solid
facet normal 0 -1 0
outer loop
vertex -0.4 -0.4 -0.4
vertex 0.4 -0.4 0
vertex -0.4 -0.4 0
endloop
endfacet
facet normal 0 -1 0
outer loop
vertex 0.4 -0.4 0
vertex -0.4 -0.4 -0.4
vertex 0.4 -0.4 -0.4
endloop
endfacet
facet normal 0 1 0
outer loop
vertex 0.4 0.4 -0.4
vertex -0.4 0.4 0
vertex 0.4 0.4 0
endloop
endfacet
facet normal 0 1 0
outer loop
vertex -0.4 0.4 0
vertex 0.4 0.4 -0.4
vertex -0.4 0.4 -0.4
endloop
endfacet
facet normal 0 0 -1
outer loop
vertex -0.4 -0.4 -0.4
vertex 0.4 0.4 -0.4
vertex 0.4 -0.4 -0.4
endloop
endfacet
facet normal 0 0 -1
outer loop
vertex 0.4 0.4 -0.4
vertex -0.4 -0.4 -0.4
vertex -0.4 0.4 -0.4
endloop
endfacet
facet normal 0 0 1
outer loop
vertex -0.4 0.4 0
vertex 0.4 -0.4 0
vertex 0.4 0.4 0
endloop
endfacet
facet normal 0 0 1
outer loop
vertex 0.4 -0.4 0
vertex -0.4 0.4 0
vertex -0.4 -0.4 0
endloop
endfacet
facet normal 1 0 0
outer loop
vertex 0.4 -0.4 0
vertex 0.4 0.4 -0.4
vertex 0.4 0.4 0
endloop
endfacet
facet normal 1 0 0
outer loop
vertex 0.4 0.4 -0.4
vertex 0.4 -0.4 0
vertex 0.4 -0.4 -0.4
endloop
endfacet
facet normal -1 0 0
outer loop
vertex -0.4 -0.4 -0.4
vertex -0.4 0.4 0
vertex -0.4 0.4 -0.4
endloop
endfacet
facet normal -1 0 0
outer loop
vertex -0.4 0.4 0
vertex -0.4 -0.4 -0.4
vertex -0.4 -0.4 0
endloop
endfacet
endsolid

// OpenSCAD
use <../lib.scad>
function ldraw_lib__box3u5p() = [
// 0 Box with  3 Faces without  5 Edges
// 0 Name: box3u5p.dat
// 0 Author: Willy Tschager [Holly-Wood]
// 0 !LDRAW_ORG Primitive UPDATE 2024-01
// 0 !LICENSE Licensed under CC BY 4.0 : see CAreadme.txt
// 
// 0 BFC CERTIFY CCW
  [0,"BFC","CERTIFY"],
  [0,"BFC","CCW"],
// 
// 0 !HISTORY 2009-09-03 [PTadmin] Official Update 2009-02
// 0 !HISTORY 2024-01-02 [Holly-Wood] Complete re-write, original by WilliamH
// 0 !HISTORY 2024-01-29 [OrionP] Official Update 2024-01
// 
// 2 24 1 1 -1 -1 1 -1
  [2,24,1,1,-1,-1,1,-1],
// 2 24 1 0 -1 -1 0 -1
  [2,24,1,0,-1,-1,0,-1],
// 4 16 -1 0 -1 -1 1 -1 1 1 -1 1 0 -1
  [4,16,-1,0,-1,-1,1,-1,1,1,-1,1,0,-1],
// 
// 2 24 -1 1 1 1 1 1
  [2,24,-1,1,1,1,1,1],
// 2 24 -1 0 1 1 0 1
  [2,24,-1,0,1,1,0,1],
// 4 16 1 0 1 1 1 1 -1 1 1 -1 0 1
  [4,16,1,0,1,1,1,1,-1,1,1,-1,0,1],
// 
// 2 24 -1 1 1 -1 1 -1
  [2,24,-1,1,1,-1,1,-1],
// 4 16 1 1 1 1 1 -1 -1 1 -1 -1 1 1
  [4,16,1,1,1,1,1,-1,-1,1,-1,-1,1,1],
// 
// 2 24 -1 0 1 -1 1 1
  [2,24,-1,0,1,-1,1,1],
// 2 24 -1 0 -1 -1 1 -1
  [2,24,-1,0,-1,-1,1,-1],
  [-4,16,1,0,1,-1,0,1,-1,0,-1,1,0,-1],
  [-4,16,1,0,1,1,0,-1,1,1,-1,1,1,1],
  [-4,16,-1,0,-1,-1,0,1,-1,1,1,-1,1,-1],
];
module ldraw_lib__box3u5p(step=0, col=false, unit=2/5, alt=false, line=0.2, solid=!$preview)
    makepoly(ldraw_lib__box3u5p(), step=step, col=col, unit=unit, alt=alt, line=line, solid=solid);
ldraw_lib__box3u5p(line=0.2);
